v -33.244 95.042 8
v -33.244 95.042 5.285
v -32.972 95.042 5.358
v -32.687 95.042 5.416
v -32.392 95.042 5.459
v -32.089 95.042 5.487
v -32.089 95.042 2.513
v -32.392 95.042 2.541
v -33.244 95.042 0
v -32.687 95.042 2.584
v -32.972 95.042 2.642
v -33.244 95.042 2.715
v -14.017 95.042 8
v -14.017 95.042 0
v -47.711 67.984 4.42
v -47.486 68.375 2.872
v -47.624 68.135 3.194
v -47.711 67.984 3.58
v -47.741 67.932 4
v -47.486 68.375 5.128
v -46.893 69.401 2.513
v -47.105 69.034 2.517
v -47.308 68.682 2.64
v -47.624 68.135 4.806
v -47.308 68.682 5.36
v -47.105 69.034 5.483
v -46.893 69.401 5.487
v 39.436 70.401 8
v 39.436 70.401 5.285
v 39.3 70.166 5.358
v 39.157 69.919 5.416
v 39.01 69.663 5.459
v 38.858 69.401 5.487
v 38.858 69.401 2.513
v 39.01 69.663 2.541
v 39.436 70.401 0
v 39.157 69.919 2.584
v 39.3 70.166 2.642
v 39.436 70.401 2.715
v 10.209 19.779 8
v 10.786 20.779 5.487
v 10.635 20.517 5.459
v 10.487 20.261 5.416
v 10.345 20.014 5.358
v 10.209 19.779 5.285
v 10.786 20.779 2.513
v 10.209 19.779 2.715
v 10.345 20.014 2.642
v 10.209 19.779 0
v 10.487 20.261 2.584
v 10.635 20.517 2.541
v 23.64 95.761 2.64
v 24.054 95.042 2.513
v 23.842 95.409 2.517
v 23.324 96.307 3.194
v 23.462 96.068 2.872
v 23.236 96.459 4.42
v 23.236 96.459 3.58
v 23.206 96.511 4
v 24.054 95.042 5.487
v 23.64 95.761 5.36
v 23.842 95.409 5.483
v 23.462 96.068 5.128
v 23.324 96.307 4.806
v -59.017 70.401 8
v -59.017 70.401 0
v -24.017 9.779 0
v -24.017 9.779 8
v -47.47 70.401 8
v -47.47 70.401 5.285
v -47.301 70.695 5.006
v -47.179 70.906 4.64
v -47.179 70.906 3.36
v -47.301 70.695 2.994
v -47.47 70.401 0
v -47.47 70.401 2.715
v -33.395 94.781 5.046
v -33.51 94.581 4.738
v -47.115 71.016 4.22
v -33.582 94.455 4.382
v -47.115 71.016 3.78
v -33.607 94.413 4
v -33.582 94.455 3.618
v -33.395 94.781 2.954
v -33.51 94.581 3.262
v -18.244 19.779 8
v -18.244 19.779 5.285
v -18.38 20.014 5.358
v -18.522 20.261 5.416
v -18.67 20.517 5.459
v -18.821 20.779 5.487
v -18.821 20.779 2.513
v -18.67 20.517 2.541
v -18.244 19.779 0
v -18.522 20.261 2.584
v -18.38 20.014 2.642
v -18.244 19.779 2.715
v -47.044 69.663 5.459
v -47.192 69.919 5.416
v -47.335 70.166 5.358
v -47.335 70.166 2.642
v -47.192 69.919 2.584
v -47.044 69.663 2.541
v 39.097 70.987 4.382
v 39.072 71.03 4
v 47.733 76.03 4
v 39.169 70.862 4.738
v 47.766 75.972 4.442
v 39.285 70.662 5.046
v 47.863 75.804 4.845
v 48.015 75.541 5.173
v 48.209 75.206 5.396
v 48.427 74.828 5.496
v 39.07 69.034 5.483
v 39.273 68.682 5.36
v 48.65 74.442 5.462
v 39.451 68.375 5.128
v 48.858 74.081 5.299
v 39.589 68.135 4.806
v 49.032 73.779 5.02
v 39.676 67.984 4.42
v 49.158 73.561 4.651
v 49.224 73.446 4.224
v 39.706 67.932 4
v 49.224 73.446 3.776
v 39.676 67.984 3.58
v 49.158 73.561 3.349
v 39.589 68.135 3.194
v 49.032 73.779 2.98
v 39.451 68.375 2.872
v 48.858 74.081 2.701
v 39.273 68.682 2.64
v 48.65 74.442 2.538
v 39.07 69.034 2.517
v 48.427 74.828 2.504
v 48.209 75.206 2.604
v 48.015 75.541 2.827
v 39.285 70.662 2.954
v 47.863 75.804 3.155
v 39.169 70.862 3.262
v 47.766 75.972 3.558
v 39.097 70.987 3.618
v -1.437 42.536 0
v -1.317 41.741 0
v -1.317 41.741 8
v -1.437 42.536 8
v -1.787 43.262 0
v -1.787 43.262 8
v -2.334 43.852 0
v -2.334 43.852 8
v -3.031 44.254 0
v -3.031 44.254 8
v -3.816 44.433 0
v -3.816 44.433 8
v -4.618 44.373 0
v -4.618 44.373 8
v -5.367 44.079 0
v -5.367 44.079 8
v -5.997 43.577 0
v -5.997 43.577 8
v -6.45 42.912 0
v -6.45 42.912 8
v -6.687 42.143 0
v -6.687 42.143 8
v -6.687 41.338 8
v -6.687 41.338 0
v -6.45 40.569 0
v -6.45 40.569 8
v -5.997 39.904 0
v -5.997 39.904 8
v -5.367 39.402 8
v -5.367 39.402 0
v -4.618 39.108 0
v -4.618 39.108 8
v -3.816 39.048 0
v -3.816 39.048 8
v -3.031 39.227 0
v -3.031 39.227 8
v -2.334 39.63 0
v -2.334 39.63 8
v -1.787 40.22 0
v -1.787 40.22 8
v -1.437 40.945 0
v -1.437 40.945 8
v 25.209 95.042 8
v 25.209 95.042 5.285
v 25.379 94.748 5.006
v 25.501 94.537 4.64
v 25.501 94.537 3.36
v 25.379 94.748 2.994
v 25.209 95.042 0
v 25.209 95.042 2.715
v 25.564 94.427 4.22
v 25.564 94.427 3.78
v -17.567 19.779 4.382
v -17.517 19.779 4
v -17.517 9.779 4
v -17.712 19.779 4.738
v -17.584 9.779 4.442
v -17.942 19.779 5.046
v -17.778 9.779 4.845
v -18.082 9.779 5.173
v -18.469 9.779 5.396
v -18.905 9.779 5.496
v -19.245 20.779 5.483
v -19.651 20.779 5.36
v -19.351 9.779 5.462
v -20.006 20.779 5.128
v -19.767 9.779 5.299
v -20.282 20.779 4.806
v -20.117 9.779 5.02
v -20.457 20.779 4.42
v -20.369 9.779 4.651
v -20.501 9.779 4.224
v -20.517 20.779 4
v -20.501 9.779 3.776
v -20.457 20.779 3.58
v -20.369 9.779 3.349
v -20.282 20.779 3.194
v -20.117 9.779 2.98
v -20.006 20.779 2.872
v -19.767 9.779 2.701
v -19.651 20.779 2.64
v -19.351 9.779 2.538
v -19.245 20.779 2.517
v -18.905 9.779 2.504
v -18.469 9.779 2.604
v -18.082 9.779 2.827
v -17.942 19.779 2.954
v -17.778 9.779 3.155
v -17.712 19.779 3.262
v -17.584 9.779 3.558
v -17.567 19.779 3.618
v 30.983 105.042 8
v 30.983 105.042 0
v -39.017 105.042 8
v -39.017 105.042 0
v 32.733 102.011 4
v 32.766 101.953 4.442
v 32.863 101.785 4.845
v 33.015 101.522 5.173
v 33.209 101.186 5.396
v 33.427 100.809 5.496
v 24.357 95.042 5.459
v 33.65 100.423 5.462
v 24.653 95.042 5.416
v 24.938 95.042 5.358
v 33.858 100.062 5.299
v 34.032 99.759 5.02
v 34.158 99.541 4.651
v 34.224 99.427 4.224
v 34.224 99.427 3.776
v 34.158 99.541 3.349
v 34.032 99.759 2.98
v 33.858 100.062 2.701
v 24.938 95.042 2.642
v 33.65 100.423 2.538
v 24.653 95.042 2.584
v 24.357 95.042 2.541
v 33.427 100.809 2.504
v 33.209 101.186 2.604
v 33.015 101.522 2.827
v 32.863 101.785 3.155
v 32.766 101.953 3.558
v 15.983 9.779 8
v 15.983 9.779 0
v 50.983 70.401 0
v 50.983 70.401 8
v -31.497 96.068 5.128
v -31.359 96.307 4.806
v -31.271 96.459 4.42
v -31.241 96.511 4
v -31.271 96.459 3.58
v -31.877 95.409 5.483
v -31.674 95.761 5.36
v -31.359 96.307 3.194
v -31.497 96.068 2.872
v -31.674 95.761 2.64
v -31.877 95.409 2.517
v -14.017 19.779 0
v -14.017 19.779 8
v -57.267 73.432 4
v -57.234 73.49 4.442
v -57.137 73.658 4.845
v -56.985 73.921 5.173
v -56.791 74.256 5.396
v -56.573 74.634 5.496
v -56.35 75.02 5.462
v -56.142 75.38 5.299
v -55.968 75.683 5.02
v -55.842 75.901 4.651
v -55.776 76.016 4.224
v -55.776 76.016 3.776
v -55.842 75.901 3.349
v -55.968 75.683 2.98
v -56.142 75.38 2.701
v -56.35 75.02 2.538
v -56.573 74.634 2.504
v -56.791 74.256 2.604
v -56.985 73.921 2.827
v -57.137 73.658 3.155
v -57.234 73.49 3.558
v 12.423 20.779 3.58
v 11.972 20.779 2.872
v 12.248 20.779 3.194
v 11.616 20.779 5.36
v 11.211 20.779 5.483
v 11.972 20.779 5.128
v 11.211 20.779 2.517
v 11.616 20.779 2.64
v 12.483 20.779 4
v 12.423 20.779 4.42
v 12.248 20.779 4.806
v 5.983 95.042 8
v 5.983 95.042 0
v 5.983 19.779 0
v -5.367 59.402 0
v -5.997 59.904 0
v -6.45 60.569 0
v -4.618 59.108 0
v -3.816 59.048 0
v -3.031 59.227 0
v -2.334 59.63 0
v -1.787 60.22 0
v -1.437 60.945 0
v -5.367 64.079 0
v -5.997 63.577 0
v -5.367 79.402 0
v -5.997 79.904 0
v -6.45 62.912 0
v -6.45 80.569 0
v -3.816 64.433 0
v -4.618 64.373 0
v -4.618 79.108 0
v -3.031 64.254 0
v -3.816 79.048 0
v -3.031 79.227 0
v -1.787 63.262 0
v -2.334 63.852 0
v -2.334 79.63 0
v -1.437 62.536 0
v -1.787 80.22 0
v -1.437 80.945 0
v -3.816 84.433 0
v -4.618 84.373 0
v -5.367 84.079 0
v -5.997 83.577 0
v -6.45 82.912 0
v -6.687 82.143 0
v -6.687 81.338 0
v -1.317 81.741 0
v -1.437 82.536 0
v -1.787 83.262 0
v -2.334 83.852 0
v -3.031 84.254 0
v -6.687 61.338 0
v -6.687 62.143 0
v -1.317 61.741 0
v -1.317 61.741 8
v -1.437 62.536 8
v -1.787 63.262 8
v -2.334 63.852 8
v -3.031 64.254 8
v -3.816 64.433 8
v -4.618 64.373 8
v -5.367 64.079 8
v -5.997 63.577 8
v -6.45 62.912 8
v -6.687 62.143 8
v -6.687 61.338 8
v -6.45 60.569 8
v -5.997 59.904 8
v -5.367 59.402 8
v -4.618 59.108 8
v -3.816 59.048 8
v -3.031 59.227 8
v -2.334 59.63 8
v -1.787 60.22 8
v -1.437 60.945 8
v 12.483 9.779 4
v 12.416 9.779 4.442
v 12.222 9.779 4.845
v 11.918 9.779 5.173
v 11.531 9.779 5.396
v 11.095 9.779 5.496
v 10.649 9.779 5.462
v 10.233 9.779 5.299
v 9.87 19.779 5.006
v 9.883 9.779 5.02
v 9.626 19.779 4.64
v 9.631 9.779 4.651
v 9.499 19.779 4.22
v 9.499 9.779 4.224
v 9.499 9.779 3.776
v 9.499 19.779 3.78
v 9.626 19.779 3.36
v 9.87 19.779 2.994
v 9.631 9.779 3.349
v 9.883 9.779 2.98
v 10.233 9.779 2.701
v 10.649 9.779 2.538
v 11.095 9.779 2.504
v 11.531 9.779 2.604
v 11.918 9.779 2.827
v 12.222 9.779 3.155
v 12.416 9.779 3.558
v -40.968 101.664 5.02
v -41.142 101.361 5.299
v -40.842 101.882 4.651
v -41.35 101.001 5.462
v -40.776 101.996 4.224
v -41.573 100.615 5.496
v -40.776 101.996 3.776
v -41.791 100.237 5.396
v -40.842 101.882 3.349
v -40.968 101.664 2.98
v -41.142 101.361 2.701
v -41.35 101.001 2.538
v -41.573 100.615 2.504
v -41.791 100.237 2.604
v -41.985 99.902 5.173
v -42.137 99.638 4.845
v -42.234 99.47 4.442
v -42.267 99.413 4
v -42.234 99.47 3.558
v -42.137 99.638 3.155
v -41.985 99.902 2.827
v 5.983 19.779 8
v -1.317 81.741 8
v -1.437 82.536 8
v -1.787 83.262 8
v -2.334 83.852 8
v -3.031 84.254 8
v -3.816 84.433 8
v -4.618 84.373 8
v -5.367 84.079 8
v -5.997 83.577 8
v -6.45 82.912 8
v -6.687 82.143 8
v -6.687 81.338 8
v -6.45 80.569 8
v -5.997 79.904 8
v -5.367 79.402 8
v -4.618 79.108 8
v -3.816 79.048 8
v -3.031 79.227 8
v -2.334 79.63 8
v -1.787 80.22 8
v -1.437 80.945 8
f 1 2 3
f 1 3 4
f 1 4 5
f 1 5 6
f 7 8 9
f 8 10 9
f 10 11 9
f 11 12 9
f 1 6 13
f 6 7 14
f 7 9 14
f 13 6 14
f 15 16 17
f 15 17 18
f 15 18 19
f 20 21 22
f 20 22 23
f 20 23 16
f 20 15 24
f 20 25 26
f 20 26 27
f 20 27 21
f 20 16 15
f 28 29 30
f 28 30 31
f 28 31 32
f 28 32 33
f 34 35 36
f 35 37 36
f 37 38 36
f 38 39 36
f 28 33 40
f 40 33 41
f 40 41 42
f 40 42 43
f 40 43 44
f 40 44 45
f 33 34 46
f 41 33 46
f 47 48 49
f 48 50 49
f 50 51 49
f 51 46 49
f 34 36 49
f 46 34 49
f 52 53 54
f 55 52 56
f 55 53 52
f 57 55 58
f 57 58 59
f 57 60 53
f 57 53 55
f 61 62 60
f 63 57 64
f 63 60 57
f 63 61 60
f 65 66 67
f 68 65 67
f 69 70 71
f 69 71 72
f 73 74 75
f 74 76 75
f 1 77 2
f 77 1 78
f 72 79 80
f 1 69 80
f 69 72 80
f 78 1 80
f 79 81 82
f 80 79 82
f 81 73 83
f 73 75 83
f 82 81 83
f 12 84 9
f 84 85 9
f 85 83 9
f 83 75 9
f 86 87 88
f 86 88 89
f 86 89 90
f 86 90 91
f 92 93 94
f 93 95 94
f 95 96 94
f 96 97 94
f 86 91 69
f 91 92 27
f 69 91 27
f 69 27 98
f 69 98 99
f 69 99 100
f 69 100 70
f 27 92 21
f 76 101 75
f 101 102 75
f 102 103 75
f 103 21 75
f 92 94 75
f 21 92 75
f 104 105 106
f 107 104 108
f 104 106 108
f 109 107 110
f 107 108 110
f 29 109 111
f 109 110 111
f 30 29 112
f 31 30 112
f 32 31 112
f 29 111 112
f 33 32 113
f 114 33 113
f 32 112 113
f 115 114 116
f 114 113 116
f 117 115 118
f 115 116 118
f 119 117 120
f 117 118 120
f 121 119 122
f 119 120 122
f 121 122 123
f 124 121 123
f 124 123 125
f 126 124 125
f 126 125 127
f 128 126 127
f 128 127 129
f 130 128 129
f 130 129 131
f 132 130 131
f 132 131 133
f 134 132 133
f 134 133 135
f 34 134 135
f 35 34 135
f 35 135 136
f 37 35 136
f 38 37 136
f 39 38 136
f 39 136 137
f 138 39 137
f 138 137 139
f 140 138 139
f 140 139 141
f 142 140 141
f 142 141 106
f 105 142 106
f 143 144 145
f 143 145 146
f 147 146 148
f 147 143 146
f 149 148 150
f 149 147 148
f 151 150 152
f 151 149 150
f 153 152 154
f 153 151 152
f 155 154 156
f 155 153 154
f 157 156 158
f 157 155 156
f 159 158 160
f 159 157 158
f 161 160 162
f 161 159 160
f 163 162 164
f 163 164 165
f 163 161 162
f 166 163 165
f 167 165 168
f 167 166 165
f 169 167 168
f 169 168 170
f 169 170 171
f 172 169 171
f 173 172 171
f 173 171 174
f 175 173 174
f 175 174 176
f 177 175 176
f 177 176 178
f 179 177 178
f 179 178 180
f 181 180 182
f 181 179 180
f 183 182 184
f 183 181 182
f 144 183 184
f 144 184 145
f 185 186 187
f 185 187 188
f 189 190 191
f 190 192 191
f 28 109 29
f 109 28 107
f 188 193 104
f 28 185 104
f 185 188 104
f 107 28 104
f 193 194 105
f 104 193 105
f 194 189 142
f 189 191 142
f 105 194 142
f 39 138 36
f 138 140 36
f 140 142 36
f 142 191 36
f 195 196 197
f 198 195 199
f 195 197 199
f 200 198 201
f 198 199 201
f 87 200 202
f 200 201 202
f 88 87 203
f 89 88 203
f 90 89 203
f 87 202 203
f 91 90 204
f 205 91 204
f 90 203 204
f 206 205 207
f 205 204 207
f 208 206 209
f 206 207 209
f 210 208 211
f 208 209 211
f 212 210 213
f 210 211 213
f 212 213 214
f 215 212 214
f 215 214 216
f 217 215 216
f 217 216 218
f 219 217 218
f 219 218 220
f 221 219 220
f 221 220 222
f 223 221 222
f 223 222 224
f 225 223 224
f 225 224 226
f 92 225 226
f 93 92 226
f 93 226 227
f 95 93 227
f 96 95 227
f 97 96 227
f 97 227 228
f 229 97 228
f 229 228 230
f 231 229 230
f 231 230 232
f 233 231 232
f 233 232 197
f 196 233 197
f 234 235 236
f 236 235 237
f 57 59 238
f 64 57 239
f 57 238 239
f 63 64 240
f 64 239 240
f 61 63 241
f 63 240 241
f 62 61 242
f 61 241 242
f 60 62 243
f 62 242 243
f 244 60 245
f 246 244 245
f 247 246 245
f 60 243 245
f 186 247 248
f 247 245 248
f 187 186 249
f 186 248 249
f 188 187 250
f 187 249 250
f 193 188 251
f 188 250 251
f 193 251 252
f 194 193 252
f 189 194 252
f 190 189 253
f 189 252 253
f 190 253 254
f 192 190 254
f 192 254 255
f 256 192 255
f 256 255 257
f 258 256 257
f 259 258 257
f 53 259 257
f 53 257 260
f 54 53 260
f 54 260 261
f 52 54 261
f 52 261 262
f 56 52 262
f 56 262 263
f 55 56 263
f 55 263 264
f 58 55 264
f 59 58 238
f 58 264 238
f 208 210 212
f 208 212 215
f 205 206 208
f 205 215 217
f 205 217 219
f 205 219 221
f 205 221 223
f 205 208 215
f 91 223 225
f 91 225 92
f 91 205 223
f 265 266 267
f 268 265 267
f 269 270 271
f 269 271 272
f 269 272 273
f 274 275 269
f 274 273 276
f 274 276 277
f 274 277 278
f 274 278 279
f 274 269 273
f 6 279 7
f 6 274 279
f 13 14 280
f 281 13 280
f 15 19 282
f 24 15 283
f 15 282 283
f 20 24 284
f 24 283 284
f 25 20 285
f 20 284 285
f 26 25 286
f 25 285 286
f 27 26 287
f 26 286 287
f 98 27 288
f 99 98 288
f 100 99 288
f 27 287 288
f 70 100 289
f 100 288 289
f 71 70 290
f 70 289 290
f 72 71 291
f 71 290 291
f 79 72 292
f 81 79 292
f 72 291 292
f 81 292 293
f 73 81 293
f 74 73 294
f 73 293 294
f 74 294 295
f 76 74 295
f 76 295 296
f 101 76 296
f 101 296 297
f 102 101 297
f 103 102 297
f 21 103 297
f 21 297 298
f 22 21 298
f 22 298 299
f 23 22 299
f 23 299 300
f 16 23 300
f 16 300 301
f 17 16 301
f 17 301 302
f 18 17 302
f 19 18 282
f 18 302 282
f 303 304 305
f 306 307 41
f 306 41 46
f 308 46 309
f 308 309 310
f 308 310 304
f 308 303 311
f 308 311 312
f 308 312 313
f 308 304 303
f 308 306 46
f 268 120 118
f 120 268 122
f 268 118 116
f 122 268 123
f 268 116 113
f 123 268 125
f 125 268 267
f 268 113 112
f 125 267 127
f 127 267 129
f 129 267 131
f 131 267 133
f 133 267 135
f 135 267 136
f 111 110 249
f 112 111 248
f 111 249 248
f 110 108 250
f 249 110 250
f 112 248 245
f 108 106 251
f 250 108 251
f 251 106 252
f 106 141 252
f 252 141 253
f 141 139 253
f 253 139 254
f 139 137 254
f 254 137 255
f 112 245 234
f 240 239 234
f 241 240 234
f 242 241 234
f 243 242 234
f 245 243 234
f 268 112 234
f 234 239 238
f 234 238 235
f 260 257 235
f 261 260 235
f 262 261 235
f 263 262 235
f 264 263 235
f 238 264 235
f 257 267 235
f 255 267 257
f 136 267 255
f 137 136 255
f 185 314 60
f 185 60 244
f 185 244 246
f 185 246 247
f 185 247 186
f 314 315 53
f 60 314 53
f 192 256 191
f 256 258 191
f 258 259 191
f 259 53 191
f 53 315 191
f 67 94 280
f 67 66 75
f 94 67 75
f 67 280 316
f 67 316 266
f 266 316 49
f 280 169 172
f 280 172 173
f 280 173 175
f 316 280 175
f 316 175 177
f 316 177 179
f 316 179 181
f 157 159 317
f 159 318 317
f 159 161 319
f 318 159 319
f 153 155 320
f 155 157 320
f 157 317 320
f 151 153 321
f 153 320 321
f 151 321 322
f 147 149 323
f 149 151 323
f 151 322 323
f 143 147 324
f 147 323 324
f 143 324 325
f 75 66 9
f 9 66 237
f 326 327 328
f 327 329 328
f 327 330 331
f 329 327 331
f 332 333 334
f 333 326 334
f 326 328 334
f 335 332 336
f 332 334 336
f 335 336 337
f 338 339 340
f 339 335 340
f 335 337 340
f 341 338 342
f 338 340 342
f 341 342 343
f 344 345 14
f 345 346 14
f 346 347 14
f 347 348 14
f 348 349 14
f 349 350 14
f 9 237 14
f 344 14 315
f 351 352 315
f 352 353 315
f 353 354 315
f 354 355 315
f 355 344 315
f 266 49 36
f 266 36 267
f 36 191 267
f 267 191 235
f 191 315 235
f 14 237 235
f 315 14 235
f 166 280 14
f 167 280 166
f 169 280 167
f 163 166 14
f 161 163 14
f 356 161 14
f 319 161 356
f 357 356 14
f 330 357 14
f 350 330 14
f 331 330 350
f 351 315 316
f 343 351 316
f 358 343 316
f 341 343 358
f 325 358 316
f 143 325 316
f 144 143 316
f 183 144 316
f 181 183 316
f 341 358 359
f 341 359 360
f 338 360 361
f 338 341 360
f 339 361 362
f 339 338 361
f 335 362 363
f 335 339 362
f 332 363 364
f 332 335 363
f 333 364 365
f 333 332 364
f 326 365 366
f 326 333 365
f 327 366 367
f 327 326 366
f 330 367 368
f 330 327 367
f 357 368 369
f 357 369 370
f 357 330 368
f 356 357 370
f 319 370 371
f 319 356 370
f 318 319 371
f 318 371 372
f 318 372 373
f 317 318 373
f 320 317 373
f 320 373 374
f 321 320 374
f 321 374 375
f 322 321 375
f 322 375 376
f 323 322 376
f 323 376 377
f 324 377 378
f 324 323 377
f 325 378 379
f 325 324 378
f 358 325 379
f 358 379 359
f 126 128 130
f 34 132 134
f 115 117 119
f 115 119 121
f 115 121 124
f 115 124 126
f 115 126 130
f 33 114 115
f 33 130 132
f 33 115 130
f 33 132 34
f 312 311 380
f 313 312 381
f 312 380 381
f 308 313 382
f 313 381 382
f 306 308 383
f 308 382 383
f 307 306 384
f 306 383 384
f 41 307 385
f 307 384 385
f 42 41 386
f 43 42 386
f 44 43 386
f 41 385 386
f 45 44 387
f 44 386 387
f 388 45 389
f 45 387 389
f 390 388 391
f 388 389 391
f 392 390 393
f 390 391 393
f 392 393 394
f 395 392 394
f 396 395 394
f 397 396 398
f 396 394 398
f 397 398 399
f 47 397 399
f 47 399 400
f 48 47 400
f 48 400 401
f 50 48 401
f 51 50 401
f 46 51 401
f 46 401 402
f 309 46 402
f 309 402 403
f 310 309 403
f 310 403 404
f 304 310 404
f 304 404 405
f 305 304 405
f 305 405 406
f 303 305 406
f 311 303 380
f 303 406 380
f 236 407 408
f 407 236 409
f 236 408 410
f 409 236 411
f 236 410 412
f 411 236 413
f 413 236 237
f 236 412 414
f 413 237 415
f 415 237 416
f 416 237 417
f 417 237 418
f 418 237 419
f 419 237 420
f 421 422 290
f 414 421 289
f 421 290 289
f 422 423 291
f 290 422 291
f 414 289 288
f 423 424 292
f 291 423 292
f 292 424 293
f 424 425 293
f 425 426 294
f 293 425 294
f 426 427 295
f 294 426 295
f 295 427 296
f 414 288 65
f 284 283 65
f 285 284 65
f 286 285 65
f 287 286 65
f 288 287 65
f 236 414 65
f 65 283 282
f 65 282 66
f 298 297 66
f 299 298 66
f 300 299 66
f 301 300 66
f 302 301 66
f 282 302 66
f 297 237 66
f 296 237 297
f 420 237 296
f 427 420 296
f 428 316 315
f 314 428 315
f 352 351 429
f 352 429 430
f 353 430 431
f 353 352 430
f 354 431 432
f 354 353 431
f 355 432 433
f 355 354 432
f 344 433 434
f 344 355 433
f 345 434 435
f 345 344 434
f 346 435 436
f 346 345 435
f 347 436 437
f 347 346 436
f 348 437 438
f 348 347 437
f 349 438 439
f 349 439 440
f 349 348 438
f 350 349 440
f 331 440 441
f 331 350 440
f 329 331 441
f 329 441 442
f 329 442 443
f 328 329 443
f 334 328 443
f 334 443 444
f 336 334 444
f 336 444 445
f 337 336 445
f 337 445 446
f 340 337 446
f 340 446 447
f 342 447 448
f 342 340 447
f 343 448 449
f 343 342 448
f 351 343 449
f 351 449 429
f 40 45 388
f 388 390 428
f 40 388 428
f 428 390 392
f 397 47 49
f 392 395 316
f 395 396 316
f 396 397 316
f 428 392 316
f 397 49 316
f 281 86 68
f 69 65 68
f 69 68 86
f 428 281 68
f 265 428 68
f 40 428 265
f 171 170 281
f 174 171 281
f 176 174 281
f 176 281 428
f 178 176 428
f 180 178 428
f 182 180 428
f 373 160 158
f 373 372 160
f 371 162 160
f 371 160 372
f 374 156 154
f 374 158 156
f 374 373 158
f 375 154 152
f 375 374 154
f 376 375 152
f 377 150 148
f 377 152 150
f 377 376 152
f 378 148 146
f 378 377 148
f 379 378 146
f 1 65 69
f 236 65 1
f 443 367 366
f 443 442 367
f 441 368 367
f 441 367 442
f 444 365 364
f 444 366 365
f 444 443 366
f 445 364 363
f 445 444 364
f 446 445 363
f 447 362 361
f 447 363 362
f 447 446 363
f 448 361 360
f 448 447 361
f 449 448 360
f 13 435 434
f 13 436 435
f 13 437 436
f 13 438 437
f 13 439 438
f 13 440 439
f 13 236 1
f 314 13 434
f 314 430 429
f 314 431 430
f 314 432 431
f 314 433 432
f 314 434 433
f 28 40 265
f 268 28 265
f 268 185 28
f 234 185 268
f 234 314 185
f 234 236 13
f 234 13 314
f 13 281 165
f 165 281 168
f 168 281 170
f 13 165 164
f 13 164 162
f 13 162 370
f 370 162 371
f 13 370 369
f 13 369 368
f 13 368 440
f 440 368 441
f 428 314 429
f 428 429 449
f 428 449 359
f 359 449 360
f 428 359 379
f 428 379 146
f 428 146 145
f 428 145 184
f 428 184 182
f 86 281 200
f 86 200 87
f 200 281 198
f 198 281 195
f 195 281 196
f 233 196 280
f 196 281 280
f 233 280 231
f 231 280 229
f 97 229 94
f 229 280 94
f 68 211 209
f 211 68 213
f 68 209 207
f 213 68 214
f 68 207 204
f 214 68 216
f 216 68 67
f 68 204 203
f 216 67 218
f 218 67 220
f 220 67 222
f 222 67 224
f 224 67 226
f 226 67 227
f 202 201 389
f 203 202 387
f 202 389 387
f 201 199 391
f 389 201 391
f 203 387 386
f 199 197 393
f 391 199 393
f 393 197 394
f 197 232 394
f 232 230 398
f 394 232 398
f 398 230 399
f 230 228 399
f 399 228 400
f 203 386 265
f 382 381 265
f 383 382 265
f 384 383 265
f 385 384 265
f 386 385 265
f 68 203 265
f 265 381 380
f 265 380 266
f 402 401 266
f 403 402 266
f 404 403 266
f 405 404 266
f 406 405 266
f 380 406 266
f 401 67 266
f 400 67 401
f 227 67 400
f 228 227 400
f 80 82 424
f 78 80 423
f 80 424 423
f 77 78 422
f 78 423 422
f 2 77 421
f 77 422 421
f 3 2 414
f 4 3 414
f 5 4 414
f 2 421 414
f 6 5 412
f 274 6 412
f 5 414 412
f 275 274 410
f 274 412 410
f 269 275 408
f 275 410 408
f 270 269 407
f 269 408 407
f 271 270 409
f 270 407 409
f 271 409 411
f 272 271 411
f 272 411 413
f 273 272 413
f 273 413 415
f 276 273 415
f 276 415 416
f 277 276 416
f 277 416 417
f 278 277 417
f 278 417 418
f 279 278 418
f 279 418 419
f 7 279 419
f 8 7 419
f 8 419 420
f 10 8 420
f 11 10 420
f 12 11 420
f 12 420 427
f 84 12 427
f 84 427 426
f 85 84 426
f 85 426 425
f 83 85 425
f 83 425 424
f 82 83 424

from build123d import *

# Parameters (mm, degrees)
F0_R            = 2.7
F1_DEPTH        = 8
F2_R            = 1.5
F3_DEPTH        = 11
F3_COPIES_COUNT = 3


# Not quite as in the source:
# - a pattern or mirror of a feature is missing from the dataset's text; its kind, count and spacing are read off the source's solid


with BuildPart() as f1:
    # F0 (on Top) → F1 (new body)
    with BuildSketch(Plane.XY):
        Polygon((30.9826352704, 105.0418671526), (-39.0173647296, 105.0418671526), (-59.0173647296, 70.4008510012), (-24.0173647296, 9.7790727363), (15.9826352704, 9.7790727363), (50.9826352704, 70.4008510012), align=None)
        with Locations((-4.0173647296, 41.7405969634)):
            Circle(F0_R, mode=Mode.SUBTRACT)
        Polygon((-14.0173647296, 19.7790727363), (-18.2438620377, 19.7790727363), (-47.4703593458, 70.4008510012), (-33.2438620377, 95.0418671526), (-14.0173647296, 95.0418671526), align=None, mode=Mode.SUBTRACT)
        Polygon((25.2091325785, 95.0418671526), (39.4356298866, 70.4008510012), (10.2091325785, 19.7790727363), (5.9826352704, 19.7790727363), (5.9826352704, 95.0418671526), align=None, mode=Mode.SUBTRACT)
        with Locations((-4.0173647296, 61.7405969634)):
            Circle(F0_R, mode=Mode.SUBTRACT)
        with Locations((-4.0173647296, 81.7405969634)):
            Circle(F0_R, mode=Mode.SUBTRACT)
    extrude(amount=F1_DEPTH)

    # F2 (on face) → F3 (cut)
    with BuildSketch(Plane.XZ.offset(-9.7790727363)):
        with Locations((10.9826352704, 4)):
            Circle(F2_R)
        with Locations((-19.0173647296, 4)):
            Circle(F2_R)
    f3 = extrude(amount=-F3_DEPTH, mode=Mode.SUBTRACT)

    # F3_copies: F3 ×3 about axis
    f3_copies_axis = Axis((-4.017365, 61.740597, 0), (0, 0, 1))
    for i in range(1, F3_COPIES_COUNT):
        add(f3.rotate(f3_copies_axis, i * 360 / F3_COPIES_COUNT), mode=Mode.SUBTRACT)


solid = f1.part
